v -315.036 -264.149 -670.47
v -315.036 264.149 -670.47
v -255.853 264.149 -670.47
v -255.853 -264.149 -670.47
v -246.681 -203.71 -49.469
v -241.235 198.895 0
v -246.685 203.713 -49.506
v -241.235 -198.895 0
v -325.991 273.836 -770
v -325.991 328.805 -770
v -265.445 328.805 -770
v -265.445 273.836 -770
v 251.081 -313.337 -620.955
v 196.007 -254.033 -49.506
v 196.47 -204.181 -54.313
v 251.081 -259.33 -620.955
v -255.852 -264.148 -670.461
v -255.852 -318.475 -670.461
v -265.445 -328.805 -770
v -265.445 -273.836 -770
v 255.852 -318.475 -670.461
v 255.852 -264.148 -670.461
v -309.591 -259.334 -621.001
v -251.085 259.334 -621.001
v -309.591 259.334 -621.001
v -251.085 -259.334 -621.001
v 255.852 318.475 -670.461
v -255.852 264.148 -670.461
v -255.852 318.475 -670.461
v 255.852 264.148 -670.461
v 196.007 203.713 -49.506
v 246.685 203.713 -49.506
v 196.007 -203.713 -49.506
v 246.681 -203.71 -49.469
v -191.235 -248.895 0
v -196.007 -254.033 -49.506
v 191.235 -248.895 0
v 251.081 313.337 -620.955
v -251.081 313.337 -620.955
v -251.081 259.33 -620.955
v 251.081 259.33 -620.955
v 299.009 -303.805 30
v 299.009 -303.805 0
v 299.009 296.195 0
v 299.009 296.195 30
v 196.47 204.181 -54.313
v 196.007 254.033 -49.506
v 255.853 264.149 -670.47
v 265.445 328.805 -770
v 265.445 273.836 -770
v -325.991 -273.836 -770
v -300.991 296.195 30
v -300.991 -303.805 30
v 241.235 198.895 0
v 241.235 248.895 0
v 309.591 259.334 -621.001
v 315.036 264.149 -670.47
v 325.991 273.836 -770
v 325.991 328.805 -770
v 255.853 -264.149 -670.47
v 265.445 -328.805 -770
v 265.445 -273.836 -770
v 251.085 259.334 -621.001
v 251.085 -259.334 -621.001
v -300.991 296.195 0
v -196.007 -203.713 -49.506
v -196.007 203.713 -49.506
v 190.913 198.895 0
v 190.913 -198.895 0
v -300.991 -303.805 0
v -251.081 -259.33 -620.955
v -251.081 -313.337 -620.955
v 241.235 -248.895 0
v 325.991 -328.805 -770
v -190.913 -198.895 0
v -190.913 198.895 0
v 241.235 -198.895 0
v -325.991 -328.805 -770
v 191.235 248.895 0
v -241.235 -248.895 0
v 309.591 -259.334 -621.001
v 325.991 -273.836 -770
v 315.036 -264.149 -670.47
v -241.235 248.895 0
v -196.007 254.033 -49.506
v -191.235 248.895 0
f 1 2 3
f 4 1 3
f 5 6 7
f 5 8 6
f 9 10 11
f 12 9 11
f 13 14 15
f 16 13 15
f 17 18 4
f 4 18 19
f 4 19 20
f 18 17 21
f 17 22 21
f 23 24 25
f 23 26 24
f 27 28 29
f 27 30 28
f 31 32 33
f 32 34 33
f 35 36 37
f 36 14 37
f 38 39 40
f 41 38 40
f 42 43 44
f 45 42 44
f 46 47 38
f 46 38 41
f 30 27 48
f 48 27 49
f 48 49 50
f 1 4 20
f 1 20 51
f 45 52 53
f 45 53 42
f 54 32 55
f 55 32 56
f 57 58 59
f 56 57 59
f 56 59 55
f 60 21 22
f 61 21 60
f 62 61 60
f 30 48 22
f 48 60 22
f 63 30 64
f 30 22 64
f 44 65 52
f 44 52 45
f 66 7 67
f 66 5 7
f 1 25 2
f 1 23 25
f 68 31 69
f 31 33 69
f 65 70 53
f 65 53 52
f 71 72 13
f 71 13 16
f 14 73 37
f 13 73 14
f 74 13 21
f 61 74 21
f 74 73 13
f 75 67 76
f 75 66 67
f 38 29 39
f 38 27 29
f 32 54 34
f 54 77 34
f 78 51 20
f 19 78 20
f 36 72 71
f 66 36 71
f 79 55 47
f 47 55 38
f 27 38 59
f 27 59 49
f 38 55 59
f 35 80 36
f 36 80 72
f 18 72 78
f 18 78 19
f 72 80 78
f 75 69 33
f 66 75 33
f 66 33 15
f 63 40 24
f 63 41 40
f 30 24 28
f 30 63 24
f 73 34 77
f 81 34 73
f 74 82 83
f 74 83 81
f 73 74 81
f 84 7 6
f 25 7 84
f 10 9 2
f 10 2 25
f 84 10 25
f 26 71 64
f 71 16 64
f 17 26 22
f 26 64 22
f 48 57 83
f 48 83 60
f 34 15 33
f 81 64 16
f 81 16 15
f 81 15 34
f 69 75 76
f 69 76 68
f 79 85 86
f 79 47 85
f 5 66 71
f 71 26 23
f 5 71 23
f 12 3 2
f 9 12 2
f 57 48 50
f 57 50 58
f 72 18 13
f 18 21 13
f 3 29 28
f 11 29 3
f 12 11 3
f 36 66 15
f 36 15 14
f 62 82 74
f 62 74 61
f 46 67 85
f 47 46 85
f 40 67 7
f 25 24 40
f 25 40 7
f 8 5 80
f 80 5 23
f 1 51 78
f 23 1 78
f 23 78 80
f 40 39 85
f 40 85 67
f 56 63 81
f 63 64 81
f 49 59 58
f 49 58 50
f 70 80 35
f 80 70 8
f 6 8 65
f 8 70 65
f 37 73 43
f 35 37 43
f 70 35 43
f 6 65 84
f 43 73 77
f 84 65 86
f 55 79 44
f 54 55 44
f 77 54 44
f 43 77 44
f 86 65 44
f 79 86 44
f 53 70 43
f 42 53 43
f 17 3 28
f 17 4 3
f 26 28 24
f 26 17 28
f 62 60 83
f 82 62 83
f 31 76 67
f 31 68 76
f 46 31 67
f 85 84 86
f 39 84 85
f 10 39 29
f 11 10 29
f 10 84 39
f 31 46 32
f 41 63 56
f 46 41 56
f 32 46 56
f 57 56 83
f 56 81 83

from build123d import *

# Parameters (mm, degrees)
F0_W     = 600
F0_H     = 600
F1_DEPTH = 30
F2_W     = 50
F2_H     = 50
F4_W     = 60.5461252972
F4_H     = 54.9688454909


with BuildPart() as f1:
    # F0 (on Top) → F1 (new body)
    with BuildSketch(Plane.XY):
        with Locations((-0.9914571419, -3.804606373)):
            Rectangle(F0_W, F0_H)
    extrude(amount=F1_DEPTH)

    # F7: F6_1, F5 across plane


with BuildPart() as f5:
    # F2 (on Top) → F5 section 0
    with BuildSketch(Plane.XY):
        with Locations((-216.2354439497, -223.8953137973)):
            Rectangle(F2_W, F2_H)
    # F4 (on offset) → F5 section 1
    with BuildSketch(Plane.XY.offset(-770)):
        with Locations((-295.7183944933, -301.3201836275)):
            Rectangle(F4_W, F4_H)
    loft()


with BuildPart() as f6_1:
    # F6: instance of F5
    add(f5.part.mirror(Plane.YZ))


with BuildPart() as f1_1:
    add(f1.part)
    add(f6_1.part.mirror(Plane.XZ))
    add(f5.part.mirror(Plane.XZ))


    add(f5.part)  # F19 merges F5

    add(f6_1.part)  # F19 merges F6_1
    # F19: F18 across plane


with BuildPart() as f10:
    # F9 (on face) → F10 section 0
    with BuildSketch(Plane(origin=(-189.4755147525, 0, 18.2609827385), x_dir=(0, 1, 0), z_dir=(0.9953878919, 0, -0.0959319791))):
        Polygon((259.3299424331, -642.1780271339), (264.1481227465, -691.9133727984), (318.4746398428, -691.9133727984), (313.336995282, -642.1780271339), align=None)
    # F8 (on face) → F10 section 1
    with BuildSketch(Plane(origin=(189.4755147525, 0, 18.2609827385), x_dir=(0, -1, 0), z_dir=(-0.9953878919, 0, -0.0959319791))):
        Polygon((-313.336995282, -642.1780271339), (-318.4746398428, -691.9133727984), (-264.1481227465, -691.9133727984), (-259.3299424331, -642.1780271339), align=None)
    loft()


with BuildPart() as f11_1:
    # F11: instance of F10
    add(f10.part.mirror(Plane.XZ))


with BuildPart() as f14:
    # F13 (on face) → F14 section 0
    with BuildSketch(Plane(origin=(0, 197.0290144931, 19.175899266), x_dir=(1, 0, 0), z_dir=(0, -0.9952972799, -0.0968675625))):
        Polygon((-255.8530072263, -692.904708192), (-251.0853709275, -643.202091898), (-309.5907715802, -643.202091898), (-315.0359468324, -692.904708192), align=None)
    # F12 (on face) → F14 section 1
    with BuildSketch(Plane(origin=(0, -197.0290144931, 19.175899266), x_dir=(-1, 0, 0), z_dir=(0, 0.9952972799, -0.0968675625))):
        Polygon((251.0853709275, -643.202091898), (255.8530072263, -692.904708192), (315.0359468324, -692.904708192), (309.5907715802, -643.202091898), align=None)
    loft()


with BuildPart() as f15_1:
    # F15: instance of F14
    add(f14.part.mirror(Plane.YZ))


with BuildPart() as f18:
    # F17 (on face) → F18 section 0
    with BuildSketch(Plane(origin=(-189.4755147525, 0, 18.2609827385), x_dir=(0, 1, 0), z_dir=(0.9953878919, 0, -0.0959319791))):
        Polygon((254.0329583581, -68.080940268), (248.8953137973, -18.3455946035), (198.8953137973, -18.3455946035), (203.7134941108, -68.080940268), align=None)
    # F16 (on face) → F18 section 1
    with BuildSketch(Plane(origin=(189.4755147525, 0, 18.2609827385), x_dir=(0, -1, 0), z_dir=(-0.9953878919, 0, -0.0959319791))):
        Polygon((-198.8953137973, -18.3455946035), (-248.8953137973, -18.3455946035), (-254.0329583581, -68.080940268), (-204.1813530846, -72.9103833916), align=None)
    loft()


with BuildPart() as f1_2:
    add(f1_1.part)
    add(f18.part.mirror(Plane.XZ))



with BuildPart() as f22:
    # F21 (on face) → F22 section 0
    with BuildSketch(Plane(origin=(0, 197.0290144931, 19.175899266), x_dir=(1, 0, 0), z_dir=(0, -0.9952972799, -0.0968675625))):
        Polygon((-190.9130329513, -19.2665042431), (-241.2354439497, -19.2665042431), (-246.6847009277, -69.0063778227), (-196.0066540883, -69.0063778227), align=None)
    # F20 (on face) → F22 section 1
    with BuildSketch(Plane(origin=(0, -197.0290144931, 19.175899266), x_dir=(-1, 0, 0), z_dir=(0, 0.9952972799, -0.0968675625))):
        Polygon((241.2354439497, -19.2665042431), (190.9130329513, -19.2665042431), (196.0066540883, -69.0063778227), (246.6806192019, -68.9691205372), align=None)
    loft()


with BuildPart() as f1_3:
    add(f1_2.part)

    add(f10.part)  # F23 merges F10

    add(f11_1.part)  # F23 merges F11_1

    add(f14.part)  # F23 merges F14

    add(f15_1.part)  # F23 merges F15_1

    add(f18.part)  # F23 merges F18

    add(f22.part)  # F23 merges F22
    # F23: F22 across plane
    add(f22.part.mirror(Plane.YZ))


solid = f1_3.part
